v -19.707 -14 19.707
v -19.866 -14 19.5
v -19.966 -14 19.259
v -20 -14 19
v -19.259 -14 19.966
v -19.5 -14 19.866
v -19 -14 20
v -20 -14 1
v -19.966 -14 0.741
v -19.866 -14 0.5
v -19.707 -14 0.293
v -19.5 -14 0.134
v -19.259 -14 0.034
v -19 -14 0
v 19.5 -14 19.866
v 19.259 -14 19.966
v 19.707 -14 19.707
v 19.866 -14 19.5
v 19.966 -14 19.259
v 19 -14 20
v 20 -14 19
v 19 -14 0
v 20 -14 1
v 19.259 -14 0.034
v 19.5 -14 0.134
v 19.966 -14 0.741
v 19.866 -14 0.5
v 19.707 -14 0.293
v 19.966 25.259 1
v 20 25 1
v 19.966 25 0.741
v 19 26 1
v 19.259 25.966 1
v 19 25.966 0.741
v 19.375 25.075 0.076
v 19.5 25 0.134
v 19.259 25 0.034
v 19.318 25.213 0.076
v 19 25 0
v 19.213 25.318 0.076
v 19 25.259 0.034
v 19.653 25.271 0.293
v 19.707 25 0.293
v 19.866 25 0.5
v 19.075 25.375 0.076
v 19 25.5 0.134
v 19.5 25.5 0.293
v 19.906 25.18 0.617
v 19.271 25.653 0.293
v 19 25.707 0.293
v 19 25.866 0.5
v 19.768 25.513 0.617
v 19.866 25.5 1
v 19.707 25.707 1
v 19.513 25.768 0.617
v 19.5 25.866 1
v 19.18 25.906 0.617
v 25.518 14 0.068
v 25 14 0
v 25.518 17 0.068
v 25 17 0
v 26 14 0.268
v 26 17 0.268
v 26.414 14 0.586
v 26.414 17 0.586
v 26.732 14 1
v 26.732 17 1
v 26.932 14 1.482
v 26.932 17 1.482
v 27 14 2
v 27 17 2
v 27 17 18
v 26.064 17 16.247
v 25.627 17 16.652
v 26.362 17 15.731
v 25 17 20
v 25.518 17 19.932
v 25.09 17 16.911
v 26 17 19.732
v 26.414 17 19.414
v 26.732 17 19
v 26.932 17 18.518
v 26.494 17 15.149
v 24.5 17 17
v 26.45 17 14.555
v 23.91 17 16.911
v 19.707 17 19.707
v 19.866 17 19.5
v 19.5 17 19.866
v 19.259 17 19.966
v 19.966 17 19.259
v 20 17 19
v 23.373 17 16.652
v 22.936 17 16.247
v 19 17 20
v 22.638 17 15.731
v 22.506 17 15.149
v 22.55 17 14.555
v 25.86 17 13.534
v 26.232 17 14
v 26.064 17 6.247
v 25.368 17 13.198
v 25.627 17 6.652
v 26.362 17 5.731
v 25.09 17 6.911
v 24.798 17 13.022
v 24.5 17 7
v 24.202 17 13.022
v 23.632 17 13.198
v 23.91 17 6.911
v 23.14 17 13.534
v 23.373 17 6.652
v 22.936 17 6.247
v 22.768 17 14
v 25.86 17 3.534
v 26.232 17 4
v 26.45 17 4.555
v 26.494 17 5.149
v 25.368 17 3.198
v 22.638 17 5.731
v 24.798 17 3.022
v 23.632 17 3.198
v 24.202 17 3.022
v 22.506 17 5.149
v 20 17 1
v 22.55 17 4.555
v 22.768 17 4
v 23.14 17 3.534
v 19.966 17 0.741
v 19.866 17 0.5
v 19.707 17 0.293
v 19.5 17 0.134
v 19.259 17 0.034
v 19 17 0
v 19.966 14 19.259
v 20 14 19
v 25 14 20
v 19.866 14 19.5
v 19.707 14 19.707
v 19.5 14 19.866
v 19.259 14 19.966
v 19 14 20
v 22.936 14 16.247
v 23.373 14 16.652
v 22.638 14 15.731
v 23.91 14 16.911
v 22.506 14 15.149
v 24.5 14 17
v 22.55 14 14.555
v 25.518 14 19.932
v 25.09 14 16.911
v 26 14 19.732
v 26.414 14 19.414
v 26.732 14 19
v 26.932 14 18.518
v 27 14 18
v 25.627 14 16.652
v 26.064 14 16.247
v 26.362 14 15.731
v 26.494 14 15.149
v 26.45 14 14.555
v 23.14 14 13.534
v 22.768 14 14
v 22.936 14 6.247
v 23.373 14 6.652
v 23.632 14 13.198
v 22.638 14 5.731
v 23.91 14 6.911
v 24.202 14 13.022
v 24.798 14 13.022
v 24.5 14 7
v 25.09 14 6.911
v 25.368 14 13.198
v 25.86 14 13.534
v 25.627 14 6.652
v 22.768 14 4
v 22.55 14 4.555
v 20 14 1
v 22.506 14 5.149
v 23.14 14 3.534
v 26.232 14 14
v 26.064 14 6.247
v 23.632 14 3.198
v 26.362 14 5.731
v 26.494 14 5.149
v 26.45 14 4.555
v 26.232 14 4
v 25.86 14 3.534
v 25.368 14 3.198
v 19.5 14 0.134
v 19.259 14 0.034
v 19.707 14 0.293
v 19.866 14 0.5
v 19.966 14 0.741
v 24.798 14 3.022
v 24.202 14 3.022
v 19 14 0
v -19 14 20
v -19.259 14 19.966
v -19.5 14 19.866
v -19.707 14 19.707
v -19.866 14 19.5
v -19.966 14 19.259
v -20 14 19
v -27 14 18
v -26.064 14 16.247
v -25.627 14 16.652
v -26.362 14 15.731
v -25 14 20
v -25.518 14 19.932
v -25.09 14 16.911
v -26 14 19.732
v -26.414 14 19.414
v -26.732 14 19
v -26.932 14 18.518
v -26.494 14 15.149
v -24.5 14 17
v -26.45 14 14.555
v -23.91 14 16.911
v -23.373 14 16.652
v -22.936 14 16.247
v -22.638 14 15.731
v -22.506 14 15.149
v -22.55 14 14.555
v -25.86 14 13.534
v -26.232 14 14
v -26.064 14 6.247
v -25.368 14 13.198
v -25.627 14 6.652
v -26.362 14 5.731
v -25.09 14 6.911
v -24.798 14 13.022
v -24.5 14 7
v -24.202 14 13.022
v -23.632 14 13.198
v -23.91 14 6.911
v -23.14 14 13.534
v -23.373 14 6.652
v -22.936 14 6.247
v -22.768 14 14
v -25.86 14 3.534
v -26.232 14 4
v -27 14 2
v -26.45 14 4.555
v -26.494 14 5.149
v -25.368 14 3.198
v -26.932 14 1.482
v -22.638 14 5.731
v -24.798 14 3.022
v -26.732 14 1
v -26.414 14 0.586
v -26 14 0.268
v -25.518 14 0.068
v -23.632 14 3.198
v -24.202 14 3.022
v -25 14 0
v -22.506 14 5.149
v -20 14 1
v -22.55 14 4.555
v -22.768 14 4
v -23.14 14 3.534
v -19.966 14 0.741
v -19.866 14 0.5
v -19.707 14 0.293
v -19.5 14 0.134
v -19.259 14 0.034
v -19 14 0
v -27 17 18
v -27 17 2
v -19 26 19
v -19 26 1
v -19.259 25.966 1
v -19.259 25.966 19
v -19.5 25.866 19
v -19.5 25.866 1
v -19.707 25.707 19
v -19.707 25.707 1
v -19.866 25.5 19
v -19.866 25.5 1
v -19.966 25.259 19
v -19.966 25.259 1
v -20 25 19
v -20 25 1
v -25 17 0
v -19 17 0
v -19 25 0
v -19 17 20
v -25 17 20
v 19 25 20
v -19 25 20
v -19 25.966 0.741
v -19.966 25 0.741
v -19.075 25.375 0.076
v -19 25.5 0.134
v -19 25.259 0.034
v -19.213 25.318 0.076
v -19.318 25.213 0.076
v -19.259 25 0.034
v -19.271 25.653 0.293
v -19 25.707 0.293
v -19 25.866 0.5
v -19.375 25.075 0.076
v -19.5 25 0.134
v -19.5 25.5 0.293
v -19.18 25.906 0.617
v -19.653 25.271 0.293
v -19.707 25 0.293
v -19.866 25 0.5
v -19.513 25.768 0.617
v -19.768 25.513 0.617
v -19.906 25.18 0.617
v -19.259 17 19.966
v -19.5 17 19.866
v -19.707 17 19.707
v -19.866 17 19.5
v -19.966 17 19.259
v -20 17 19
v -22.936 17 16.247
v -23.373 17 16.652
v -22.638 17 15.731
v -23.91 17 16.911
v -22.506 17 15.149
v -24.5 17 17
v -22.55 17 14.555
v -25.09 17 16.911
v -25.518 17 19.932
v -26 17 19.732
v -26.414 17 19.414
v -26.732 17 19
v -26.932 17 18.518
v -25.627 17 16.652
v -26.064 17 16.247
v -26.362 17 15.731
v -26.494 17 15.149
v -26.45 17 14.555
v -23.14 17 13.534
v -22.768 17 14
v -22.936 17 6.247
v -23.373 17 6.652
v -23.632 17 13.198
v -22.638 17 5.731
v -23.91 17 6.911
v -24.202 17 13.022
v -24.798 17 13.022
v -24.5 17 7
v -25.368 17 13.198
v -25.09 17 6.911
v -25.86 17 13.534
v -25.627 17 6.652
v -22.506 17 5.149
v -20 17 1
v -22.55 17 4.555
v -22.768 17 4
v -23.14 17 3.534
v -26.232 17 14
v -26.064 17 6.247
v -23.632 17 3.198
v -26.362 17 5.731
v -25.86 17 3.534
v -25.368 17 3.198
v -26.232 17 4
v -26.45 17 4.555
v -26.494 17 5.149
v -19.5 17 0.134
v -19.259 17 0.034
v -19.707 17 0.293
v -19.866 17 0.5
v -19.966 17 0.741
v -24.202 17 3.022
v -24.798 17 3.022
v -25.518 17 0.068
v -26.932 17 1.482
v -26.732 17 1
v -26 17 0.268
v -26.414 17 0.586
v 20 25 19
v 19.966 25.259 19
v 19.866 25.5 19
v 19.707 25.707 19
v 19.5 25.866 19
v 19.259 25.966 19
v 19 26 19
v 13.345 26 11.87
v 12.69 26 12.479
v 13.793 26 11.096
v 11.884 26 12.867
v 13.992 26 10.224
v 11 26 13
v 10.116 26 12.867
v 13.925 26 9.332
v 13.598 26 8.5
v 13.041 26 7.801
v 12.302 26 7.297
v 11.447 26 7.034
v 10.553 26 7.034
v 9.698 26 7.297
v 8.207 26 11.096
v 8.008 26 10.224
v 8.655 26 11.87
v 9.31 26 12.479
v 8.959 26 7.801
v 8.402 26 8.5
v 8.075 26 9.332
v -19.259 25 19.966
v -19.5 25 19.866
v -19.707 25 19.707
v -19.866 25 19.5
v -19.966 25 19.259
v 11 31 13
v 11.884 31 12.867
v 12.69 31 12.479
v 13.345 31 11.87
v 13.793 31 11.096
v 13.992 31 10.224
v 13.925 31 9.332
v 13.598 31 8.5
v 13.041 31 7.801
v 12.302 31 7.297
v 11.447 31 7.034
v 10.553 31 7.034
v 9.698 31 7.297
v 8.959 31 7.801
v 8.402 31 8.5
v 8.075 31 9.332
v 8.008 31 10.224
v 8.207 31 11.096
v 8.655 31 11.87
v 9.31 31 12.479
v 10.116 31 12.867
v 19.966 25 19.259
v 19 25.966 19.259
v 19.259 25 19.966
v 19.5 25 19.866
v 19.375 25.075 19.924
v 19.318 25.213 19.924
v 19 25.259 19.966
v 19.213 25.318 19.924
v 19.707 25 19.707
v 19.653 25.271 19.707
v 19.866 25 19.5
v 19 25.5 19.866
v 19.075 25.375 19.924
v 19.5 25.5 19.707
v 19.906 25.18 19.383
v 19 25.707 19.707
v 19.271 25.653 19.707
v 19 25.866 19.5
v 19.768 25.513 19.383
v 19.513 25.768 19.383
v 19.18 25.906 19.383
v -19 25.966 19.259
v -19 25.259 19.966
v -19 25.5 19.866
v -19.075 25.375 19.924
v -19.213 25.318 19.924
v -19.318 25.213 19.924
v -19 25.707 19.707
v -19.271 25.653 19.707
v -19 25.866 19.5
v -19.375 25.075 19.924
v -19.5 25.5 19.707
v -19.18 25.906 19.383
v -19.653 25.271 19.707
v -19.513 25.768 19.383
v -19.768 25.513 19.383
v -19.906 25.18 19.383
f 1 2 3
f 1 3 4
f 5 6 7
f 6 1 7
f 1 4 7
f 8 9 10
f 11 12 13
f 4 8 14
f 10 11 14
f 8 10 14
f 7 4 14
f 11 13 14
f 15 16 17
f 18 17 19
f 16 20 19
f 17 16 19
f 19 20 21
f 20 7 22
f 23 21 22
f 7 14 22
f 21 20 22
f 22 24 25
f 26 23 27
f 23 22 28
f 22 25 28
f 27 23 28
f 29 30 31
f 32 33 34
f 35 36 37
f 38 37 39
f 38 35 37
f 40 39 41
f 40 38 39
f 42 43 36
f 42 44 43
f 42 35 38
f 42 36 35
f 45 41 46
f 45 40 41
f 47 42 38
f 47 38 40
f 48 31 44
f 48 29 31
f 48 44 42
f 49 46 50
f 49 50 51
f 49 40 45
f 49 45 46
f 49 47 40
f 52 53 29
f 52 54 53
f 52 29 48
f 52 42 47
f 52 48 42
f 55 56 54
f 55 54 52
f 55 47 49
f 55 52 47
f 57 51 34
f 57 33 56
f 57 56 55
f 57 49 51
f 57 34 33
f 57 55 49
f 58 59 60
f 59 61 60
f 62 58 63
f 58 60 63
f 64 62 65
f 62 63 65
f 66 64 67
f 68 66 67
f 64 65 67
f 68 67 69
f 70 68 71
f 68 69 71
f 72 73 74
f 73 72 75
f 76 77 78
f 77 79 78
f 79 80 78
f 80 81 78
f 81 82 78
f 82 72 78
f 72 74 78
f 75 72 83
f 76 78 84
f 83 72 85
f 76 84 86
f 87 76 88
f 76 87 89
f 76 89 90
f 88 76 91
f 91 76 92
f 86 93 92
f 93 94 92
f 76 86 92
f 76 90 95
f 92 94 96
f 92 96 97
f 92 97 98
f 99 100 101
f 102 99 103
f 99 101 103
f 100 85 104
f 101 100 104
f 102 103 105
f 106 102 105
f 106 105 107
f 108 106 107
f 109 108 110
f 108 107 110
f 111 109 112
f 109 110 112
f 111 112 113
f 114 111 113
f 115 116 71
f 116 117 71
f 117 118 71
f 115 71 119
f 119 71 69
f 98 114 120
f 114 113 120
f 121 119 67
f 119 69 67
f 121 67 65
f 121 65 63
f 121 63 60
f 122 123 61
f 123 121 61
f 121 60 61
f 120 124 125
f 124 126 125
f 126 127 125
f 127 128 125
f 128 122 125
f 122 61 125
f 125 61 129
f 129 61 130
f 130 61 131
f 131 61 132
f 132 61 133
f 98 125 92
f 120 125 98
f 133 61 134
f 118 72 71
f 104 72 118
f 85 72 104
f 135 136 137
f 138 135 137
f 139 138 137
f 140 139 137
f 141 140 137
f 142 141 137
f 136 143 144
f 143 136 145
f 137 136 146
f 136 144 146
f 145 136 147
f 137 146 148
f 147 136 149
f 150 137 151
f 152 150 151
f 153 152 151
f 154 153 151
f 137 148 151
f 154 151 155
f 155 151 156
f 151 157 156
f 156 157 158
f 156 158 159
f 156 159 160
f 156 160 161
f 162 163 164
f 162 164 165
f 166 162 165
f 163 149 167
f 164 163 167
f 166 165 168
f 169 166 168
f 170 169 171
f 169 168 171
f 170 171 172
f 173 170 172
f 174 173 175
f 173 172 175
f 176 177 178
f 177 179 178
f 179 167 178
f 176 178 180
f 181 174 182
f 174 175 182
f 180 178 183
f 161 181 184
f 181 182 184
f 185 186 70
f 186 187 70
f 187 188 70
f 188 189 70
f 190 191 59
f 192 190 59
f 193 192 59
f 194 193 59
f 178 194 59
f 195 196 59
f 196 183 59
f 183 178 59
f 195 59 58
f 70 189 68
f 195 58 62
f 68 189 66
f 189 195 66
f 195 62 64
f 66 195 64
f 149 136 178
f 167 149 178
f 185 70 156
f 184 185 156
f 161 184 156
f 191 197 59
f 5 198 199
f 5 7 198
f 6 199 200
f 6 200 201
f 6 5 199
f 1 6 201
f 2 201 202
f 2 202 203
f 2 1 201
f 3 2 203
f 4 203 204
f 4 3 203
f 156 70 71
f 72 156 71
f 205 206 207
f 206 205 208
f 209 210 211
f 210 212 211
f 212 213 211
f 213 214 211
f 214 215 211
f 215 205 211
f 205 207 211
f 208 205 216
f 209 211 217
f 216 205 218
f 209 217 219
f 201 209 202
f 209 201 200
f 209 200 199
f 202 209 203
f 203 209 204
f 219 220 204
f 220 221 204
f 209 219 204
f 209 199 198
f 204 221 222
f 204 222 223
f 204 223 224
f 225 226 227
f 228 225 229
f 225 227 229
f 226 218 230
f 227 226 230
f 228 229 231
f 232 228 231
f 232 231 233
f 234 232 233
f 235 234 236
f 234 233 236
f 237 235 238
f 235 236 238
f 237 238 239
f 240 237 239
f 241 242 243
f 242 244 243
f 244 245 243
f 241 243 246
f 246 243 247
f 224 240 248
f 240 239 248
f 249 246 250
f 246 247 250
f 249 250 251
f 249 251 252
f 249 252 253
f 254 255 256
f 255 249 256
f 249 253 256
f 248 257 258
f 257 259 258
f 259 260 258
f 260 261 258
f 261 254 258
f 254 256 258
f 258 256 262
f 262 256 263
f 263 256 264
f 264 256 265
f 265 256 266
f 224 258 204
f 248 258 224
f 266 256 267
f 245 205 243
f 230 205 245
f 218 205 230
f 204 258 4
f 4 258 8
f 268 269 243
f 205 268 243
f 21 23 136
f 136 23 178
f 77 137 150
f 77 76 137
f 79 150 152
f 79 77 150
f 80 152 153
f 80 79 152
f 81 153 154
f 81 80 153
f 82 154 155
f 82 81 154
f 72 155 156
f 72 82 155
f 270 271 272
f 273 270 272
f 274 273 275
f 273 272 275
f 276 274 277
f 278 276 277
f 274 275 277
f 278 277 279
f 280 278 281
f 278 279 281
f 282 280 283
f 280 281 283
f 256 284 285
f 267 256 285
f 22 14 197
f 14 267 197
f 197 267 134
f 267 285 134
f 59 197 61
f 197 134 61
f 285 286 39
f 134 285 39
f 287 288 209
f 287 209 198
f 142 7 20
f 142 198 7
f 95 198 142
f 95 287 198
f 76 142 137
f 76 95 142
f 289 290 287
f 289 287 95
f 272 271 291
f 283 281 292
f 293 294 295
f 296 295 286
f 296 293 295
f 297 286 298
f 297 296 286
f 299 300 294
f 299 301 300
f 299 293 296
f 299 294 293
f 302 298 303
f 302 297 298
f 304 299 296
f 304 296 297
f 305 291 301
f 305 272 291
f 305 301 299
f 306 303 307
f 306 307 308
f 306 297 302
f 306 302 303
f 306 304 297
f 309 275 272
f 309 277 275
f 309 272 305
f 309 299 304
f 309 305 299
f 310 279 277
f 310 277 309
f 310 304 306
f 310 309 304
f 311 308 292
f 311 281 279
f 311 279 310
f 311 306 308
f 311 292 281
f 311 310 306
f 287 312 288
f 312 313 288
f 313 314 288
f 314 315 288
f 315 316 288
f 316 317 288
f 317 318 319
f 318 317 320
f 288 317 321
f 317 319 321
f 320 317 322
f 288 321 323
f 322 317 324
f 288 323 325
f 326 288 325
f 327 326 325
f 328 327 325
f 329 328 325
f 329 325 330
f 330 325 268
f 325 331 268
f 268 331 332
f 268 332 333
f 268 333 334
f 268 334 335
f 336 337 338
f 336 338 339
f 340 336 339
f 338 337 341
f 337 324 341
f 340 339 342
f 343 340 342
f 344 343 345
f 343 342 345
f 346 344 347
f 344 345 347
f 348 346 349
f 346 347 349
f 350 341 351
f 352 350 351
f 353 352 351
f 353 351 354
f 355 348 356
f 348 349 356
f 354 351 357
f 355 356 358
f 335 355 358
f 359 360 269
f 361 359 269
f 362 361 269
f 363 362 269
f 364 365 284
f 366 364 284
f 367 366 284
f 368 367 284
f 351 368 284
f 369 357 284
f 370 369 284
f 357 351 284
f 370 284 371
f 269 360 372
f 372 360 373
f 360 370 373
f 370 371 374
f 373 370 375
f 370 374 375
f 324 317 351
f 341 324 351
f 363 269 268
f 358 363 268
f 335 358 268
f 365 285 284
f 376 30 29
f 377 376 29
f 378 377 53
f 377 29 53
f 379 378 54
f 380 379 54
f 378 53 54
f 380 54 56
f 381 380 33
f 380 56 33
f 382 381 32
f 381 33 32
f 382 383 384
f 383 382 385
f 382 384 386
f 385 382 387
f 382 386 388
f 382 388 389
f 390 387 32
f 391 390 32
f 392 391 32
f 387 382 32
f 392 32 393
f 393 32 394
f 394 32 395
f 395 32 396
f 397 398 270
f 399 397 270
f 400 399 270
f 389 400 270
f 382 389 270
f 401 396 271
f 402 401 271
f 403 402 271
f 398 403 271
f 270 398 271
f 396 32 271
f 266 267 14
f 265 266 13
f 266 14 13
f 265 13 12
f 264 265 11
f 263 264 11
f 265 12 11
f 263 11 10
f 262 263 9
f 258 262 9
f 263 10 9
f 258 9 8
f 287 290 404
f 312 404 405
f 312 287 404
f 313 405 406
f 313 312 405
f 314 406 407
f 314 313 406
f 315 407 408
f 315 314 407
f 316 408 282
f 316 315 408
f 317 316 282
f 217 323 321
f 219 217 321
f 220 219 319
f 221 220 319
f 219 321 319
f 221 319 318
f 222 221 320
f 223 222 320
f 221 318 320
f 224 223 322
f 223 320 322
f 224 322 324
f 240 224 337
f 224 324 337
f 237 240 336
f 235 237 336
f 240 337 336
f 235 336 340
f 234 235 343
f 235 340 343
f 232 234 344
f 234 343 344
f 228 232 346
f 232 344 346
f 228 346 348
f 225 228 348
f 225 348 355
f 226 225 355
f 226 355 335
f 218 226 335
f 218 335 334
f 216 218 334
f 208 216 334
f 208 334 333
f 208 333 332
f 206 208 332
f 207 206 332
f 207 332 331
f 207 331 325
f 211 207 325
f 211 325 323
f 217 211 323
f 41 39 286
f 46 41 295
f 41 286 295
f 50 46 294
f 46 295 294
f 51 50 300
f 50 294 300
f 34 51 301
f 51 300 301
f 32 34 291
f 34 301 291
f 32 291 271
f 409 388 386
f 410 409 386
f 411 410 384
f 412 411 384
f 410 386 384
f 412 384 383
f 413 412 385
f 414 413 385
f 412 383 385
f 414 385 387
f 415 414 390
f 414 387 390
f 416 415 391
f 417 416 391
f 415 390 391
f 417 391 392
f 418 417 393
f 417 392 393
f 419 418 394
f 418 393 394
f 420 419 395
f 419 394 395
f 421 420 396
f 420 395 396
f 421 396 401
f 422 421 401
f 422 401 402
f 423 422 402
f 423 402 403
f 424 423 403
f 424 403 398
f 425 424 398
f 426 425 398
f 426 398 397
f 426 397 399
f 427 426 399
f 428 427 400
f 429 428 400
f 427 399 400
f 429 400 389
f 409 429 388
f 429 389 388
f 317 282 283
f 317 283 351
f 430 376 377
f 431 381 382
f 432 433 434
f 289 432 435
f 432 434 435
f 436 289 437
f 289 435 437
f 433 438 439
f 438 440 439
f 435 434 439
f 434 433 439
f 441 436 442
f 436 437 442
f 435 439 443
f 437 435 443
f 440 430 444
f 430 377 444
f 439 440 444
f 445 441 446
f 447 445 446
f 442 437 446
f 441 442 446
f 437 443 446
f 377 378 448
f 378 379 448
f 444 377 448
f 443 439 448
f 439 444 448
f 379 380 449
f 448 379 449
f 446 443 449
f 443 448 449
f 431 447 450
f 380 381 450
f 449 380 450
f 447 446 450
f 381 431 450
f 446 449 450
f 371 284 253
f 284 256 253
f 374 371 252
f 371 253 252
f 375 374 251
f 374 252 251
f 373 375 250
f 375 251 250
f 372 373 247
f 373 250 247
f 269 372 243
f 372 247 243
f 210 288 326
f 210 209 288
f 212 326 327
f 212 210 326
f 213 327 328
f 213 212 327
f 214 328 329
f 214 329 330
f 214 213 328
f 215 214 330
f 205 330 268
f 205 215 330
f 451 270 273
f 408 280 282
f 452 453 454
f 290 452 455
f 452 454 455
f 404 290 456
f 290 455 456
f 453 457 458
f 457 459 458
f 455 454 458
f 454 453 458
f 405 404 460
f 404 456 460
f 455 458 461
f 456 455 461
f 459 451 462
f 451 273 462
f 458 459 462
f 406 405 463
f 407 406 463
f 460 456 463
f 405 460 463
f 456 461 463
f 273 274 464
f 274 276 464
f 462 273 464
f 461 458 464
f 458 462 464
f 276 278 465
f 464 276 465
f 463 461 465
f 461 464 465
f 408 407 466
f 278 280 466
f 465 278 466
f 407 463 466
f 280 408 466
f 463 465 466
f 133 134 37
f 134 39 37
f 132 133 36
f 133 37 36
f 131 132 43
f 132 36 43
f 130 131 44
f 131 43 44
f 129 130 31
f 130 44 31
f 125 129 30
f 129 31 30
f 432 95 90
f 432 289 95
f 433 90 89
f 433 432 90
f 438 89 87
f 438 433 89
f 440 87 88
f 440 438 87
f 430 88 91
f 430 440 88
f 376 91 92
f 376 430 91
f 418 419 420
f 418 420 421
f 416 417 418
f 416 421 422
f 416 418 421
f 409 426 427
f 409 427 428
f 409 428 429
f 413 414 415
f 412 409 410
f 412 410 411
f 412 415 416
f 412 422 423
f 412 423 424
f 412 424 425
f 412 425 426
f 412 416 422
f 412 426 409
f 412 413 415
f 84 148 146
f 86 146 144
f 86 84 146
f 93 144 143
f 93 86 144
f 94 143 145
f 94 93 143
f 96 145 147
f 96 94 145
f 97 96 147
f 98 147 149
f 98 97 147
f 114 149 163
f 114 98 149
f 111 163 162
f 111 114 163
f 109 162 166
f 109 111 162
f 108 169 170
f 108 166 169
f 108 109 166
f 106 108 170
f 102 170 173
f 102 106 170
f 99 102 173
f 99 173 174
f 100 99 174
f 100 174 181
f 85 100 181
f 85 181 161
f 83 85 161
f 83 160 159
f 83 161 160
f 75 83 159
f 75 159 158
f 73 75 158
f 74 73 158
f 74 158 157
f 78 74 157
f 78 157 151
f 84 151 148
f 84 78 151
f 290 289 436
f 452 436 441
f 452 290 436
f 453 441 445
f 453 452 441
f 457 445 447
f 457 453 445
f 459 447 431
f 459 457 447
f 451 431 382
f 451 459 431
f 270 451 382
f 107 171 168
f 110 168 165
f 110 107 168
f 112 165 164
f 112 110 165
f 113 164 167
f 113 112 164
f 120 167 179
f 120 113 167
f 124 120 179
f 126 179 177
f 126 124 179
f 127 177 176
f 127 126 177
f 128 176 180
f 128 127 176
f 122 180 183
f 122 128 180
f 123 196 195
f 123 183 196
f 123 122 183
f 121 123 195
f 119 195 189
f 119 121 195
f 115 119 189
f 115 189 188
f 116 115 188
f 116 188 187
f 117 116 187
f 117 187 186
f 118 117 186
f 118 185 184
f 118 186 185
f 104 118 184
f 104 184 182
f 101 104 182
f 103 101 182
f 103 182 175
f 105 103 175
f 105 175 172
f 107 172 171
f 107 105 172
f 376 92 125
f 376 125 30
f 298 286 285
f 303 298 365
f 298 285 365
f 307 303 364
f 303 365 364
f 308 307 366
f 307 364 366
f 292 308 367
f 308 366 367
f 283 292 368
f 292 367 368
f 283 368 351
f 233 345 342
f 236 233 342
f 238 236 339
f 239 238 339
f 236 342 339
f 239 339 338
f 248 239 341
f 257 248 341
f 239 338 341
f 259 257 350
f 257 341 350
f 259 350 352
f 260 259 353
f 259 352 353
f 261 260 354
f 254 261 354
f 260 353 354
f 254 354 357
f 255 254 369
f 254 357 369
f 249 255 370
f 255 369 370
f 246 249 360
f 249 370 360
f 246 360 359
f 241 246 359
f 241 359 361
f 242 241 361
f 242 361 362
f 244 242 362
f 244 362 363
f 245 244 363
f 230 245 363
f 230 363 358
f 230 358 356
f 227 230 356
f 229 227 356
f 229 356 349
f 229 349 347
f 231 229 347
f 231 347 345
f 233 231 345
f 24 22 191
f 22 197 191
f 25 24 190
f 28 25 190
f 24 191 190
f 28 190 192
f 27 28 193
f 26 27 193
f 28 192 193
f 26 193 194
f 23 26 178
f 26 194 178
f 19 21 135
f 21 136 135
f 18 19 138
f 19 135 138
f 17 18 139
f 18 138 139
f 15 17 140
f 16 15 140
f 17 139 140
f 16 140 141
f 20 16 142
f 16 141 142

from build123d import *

# Parameters (mm, degrees)
BOSS_EXTRUDE1_DEPTH = 20
SKETCH2_R           = 2
CUT_EXTRUDE1_DEPTH  = 20
FILLET1_R           = 2
FILLET2_R           = 1
SKETCH3_R           = 3
BOSS_EXTRUDE2_DEPTH = 5


with BuildPart() as part:
    # Sketch1 → Boss-Extrude1 (new body)
    with BuildSketch(Plane.XY):
        with BuildLine():
            Line((20, 14), (27, 14))
            Line((27, 14), (27, 17))
            Line((27, 17), (20, 17))
            Line((20, 17), (20, 25))
            ThreePointArc((20, 25), (19.707106781, 25.707106781), (19, 26))
            Line((19, 26), (-19, 26))
            ThreePointArc((-19, 26), (-19.707106781, 25.707106781), (-20, 25))
            Line((-20, 25), (-20, 17))
            Line((-20, 17), (-27, 17))
            Line((-27, 17), (-27, 14))
            Line((-27, 14), (-20, 14))
            Line((-20, 14), (-20, -14))
            Line((-20, -14), (20, -14))
            Line((20, -14), (20, 14))
        make_face()
    extrude(amount=BOSS_EXTRUDE1_DEPTH)

    # Sketch2 → Cut-Extrude1 (cut)
    with BuildSketch(Plane(origin=(0, 17, 0), x_dir=(1, 0, 0), z_dir=(0, 1, 0))):
        with Locations(Location((-24.5, -5, 0), (0, 0, 270))):
            Circle(SKETCH2_R)
        with Locations(Location((-24.5, -15, 0), (0, 0, 270))):
            Circle(SKETCH2_R)
    cut_extrude1 = extrude(amount=-CUT_EXTRUDE1_DEPTH, mode=Mode.SUBTRACT)

    # Mirror1: Cut-Extrude1 across plane
    add(cut_extrude1.mirror(Plane(origin=(0, 0, 0), x_dir=(0, 0, 1), z_dir=(1, 0, 0))), mode=Mode.SUBTRACT)

    # Fillet1
    fillet1_edges = [part.edges().sort_by_distance(p)[0] for p in [
        (27, 15.5, 20),
        (-27, 15.5, 0),
        (27, 15.5, 0),
        (-27, 15.5, 20),
    ]]
    fillet(fillet1_edges, radius=FILLET1_R)

    # Fillet2
    fillet2_edges = [part.edges().sort_by_distance(p)[0] for p in [
        (-20, 0, 0),
        (-20, 21, 0),
        (-19.707106781, 25.707106781, 0),
        (0, 26, 0),
        (19.707106781, 25.707106781, 0),
        (20, 21, 0),
        (20, 0, 0),
        (20, 21, 20),
        (19.707106781, 25.707106781, 20),
        (0, 26, 20),
        (-19.707106781, 25.707106781, 20),
        (-20, 21, 20),
        (20, 0, 20),
        (-20, 0, 20),
    ]]
    fillet(fillet2_edges, radius=FILLET2_R)

    # Sketch3 → Boss-Extrude2 (add)
    with BuildSketch(Plane(origin=(0, 26, 0), x_dir=(1, 0, 0), z_dir=(0, 1, 0))):
        with Locations(Location((11, -10, 0), (0, 0, 270))):
            Circle(SKETCH3_R)
    extrude(amount=BOSS_EXTRUDE2_DEPTH)


solid = part.part
